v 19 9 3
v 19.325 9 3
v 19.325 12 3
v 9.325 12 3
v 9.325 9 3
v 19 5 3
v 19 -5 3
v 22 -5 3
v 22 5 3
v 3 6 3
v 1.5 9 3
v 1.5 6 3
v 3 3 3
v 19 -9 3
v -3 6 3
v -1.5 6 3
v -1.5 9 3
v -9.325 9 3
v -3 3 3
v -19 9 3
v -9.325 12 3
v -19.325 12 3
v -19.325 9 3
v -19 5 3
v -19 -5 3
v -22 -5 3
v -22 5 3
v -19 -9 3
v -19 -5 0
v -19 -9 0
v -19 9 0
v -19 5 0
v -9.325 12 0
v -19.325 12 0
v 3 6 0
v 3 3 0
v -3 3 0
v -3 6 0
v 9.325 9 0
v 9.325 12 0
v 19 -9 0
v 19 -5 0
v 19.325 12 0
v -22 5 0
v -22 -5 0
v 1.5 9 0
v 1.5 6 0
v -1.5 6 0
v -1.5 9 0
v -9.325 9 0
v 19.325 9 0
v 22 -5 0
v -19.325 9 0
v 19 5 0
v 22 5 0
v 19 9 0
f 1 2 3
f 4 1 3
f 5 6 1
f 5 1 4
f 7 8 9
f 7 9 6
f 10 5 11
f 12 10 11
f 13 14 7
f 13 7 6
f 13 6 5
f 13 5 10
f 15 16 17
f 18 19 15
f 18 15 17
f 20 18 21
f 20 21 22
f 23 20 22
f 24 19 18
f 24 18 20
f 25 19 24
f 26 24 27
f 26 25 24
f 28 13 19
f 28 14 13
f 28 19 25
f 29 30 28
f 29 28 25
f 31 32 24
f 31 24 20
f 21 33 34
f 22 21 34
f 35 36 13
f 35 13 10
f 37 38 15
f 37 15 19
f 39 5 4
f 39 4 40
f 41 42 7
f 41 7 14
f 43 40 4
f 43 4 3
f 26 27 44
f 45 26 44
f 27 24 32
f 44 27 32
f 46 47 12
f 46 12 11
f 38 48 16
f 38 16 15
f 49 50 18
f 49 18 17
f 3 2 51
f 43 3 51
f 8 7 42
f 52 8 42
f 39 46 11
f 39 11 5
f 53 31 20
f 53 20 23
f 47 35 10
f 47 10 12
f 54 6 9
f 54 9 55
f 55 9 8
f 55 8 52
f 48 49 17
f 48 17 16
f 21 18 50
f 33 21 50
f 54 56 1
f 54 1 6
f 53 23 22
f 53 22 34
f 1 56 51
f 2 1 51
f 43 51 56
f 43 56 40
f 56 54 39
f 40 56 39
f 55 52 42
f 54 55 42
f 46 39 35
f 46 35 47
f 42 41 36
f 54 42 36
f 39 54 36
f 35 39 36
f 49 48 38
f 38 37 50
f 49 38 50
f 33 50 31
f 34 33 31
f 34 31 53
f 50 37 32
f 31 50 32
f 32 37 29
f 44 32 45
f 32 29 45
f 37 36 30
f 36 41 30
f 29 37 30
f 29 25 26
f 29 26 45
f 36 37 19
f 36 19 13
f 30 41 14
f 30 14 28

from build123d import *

# Parameters (mm, degrees)
SALIENTE_EXTRUIR2_DEPTH = 3
CROQUIS2_W              = 3
CROQUIS2_H              = 10
SALIENTE_EXTRUIR3_DEPTH = 3
CROQUIS3_W              = 10
CROQUIS3_H              = 3
SALIENTE_EXTRUIR4_DEPTH = 3


with BuildPart() as part:
    # Croquis1 → Saliente-Extruir2 (new body)
    with BuildSketch(Plane.XY):
        Polygon((19, -9), (-19, -9), (-19, 9), (-1.5, 9), (-1.5, 6), (-3, 6), (-3, 3), (3, 3), (3, 6), (1.5, 6), (1.5, 9), (19, 9), align=None)
    extrude(amount=SALIENTE_EXTRUIR2_DEPTH)

    # Croquis2 → Saliente-Extruir3 (add)
    with BuildSketch(Plane(origin=(19, 0, 0), x_dir=(0, 0, -1), z_dir=(1, 0, 0))):
        with Locations((-1.5, 0)):
            Rectangle(CROQUIS2_W, CROQUIS2_H)
    saliente_extruir3 = extrude(amount=SALIENTE_EXTRUIR3_DEPTH)

    # Croquis3 → Saliente-Extruir4 (add)
    with BuildSketch(Plane(origin=(0, 9, 0), x_dir=(1, 0, 0), z_dir=(0, 1, 0))):
        with Locations((14.325, -1.5)):
            Rectangle(CROQUIS3_W, CROQUIS3_H)
    saliente_extruir4 = extrude(amount=SALIENTE_EXTRUIR4_DEPTH)

    # Simetría1: Saliente-Extruir3 across plane
    add(saliente_extruir3.mirror(Plane(origin=(0, 0, 0), x_dir=(0, 0, 1), z_dir=(1, 0, 0))))

    # Simetría2: Saliente-Extruir4 across plane
    add(saliente_extruir4.mirror(Plane(origin=(0, 0, 0), x_dir=(0, 0, 1), z_dir=(1, 0, 0))))


solid = part.part
